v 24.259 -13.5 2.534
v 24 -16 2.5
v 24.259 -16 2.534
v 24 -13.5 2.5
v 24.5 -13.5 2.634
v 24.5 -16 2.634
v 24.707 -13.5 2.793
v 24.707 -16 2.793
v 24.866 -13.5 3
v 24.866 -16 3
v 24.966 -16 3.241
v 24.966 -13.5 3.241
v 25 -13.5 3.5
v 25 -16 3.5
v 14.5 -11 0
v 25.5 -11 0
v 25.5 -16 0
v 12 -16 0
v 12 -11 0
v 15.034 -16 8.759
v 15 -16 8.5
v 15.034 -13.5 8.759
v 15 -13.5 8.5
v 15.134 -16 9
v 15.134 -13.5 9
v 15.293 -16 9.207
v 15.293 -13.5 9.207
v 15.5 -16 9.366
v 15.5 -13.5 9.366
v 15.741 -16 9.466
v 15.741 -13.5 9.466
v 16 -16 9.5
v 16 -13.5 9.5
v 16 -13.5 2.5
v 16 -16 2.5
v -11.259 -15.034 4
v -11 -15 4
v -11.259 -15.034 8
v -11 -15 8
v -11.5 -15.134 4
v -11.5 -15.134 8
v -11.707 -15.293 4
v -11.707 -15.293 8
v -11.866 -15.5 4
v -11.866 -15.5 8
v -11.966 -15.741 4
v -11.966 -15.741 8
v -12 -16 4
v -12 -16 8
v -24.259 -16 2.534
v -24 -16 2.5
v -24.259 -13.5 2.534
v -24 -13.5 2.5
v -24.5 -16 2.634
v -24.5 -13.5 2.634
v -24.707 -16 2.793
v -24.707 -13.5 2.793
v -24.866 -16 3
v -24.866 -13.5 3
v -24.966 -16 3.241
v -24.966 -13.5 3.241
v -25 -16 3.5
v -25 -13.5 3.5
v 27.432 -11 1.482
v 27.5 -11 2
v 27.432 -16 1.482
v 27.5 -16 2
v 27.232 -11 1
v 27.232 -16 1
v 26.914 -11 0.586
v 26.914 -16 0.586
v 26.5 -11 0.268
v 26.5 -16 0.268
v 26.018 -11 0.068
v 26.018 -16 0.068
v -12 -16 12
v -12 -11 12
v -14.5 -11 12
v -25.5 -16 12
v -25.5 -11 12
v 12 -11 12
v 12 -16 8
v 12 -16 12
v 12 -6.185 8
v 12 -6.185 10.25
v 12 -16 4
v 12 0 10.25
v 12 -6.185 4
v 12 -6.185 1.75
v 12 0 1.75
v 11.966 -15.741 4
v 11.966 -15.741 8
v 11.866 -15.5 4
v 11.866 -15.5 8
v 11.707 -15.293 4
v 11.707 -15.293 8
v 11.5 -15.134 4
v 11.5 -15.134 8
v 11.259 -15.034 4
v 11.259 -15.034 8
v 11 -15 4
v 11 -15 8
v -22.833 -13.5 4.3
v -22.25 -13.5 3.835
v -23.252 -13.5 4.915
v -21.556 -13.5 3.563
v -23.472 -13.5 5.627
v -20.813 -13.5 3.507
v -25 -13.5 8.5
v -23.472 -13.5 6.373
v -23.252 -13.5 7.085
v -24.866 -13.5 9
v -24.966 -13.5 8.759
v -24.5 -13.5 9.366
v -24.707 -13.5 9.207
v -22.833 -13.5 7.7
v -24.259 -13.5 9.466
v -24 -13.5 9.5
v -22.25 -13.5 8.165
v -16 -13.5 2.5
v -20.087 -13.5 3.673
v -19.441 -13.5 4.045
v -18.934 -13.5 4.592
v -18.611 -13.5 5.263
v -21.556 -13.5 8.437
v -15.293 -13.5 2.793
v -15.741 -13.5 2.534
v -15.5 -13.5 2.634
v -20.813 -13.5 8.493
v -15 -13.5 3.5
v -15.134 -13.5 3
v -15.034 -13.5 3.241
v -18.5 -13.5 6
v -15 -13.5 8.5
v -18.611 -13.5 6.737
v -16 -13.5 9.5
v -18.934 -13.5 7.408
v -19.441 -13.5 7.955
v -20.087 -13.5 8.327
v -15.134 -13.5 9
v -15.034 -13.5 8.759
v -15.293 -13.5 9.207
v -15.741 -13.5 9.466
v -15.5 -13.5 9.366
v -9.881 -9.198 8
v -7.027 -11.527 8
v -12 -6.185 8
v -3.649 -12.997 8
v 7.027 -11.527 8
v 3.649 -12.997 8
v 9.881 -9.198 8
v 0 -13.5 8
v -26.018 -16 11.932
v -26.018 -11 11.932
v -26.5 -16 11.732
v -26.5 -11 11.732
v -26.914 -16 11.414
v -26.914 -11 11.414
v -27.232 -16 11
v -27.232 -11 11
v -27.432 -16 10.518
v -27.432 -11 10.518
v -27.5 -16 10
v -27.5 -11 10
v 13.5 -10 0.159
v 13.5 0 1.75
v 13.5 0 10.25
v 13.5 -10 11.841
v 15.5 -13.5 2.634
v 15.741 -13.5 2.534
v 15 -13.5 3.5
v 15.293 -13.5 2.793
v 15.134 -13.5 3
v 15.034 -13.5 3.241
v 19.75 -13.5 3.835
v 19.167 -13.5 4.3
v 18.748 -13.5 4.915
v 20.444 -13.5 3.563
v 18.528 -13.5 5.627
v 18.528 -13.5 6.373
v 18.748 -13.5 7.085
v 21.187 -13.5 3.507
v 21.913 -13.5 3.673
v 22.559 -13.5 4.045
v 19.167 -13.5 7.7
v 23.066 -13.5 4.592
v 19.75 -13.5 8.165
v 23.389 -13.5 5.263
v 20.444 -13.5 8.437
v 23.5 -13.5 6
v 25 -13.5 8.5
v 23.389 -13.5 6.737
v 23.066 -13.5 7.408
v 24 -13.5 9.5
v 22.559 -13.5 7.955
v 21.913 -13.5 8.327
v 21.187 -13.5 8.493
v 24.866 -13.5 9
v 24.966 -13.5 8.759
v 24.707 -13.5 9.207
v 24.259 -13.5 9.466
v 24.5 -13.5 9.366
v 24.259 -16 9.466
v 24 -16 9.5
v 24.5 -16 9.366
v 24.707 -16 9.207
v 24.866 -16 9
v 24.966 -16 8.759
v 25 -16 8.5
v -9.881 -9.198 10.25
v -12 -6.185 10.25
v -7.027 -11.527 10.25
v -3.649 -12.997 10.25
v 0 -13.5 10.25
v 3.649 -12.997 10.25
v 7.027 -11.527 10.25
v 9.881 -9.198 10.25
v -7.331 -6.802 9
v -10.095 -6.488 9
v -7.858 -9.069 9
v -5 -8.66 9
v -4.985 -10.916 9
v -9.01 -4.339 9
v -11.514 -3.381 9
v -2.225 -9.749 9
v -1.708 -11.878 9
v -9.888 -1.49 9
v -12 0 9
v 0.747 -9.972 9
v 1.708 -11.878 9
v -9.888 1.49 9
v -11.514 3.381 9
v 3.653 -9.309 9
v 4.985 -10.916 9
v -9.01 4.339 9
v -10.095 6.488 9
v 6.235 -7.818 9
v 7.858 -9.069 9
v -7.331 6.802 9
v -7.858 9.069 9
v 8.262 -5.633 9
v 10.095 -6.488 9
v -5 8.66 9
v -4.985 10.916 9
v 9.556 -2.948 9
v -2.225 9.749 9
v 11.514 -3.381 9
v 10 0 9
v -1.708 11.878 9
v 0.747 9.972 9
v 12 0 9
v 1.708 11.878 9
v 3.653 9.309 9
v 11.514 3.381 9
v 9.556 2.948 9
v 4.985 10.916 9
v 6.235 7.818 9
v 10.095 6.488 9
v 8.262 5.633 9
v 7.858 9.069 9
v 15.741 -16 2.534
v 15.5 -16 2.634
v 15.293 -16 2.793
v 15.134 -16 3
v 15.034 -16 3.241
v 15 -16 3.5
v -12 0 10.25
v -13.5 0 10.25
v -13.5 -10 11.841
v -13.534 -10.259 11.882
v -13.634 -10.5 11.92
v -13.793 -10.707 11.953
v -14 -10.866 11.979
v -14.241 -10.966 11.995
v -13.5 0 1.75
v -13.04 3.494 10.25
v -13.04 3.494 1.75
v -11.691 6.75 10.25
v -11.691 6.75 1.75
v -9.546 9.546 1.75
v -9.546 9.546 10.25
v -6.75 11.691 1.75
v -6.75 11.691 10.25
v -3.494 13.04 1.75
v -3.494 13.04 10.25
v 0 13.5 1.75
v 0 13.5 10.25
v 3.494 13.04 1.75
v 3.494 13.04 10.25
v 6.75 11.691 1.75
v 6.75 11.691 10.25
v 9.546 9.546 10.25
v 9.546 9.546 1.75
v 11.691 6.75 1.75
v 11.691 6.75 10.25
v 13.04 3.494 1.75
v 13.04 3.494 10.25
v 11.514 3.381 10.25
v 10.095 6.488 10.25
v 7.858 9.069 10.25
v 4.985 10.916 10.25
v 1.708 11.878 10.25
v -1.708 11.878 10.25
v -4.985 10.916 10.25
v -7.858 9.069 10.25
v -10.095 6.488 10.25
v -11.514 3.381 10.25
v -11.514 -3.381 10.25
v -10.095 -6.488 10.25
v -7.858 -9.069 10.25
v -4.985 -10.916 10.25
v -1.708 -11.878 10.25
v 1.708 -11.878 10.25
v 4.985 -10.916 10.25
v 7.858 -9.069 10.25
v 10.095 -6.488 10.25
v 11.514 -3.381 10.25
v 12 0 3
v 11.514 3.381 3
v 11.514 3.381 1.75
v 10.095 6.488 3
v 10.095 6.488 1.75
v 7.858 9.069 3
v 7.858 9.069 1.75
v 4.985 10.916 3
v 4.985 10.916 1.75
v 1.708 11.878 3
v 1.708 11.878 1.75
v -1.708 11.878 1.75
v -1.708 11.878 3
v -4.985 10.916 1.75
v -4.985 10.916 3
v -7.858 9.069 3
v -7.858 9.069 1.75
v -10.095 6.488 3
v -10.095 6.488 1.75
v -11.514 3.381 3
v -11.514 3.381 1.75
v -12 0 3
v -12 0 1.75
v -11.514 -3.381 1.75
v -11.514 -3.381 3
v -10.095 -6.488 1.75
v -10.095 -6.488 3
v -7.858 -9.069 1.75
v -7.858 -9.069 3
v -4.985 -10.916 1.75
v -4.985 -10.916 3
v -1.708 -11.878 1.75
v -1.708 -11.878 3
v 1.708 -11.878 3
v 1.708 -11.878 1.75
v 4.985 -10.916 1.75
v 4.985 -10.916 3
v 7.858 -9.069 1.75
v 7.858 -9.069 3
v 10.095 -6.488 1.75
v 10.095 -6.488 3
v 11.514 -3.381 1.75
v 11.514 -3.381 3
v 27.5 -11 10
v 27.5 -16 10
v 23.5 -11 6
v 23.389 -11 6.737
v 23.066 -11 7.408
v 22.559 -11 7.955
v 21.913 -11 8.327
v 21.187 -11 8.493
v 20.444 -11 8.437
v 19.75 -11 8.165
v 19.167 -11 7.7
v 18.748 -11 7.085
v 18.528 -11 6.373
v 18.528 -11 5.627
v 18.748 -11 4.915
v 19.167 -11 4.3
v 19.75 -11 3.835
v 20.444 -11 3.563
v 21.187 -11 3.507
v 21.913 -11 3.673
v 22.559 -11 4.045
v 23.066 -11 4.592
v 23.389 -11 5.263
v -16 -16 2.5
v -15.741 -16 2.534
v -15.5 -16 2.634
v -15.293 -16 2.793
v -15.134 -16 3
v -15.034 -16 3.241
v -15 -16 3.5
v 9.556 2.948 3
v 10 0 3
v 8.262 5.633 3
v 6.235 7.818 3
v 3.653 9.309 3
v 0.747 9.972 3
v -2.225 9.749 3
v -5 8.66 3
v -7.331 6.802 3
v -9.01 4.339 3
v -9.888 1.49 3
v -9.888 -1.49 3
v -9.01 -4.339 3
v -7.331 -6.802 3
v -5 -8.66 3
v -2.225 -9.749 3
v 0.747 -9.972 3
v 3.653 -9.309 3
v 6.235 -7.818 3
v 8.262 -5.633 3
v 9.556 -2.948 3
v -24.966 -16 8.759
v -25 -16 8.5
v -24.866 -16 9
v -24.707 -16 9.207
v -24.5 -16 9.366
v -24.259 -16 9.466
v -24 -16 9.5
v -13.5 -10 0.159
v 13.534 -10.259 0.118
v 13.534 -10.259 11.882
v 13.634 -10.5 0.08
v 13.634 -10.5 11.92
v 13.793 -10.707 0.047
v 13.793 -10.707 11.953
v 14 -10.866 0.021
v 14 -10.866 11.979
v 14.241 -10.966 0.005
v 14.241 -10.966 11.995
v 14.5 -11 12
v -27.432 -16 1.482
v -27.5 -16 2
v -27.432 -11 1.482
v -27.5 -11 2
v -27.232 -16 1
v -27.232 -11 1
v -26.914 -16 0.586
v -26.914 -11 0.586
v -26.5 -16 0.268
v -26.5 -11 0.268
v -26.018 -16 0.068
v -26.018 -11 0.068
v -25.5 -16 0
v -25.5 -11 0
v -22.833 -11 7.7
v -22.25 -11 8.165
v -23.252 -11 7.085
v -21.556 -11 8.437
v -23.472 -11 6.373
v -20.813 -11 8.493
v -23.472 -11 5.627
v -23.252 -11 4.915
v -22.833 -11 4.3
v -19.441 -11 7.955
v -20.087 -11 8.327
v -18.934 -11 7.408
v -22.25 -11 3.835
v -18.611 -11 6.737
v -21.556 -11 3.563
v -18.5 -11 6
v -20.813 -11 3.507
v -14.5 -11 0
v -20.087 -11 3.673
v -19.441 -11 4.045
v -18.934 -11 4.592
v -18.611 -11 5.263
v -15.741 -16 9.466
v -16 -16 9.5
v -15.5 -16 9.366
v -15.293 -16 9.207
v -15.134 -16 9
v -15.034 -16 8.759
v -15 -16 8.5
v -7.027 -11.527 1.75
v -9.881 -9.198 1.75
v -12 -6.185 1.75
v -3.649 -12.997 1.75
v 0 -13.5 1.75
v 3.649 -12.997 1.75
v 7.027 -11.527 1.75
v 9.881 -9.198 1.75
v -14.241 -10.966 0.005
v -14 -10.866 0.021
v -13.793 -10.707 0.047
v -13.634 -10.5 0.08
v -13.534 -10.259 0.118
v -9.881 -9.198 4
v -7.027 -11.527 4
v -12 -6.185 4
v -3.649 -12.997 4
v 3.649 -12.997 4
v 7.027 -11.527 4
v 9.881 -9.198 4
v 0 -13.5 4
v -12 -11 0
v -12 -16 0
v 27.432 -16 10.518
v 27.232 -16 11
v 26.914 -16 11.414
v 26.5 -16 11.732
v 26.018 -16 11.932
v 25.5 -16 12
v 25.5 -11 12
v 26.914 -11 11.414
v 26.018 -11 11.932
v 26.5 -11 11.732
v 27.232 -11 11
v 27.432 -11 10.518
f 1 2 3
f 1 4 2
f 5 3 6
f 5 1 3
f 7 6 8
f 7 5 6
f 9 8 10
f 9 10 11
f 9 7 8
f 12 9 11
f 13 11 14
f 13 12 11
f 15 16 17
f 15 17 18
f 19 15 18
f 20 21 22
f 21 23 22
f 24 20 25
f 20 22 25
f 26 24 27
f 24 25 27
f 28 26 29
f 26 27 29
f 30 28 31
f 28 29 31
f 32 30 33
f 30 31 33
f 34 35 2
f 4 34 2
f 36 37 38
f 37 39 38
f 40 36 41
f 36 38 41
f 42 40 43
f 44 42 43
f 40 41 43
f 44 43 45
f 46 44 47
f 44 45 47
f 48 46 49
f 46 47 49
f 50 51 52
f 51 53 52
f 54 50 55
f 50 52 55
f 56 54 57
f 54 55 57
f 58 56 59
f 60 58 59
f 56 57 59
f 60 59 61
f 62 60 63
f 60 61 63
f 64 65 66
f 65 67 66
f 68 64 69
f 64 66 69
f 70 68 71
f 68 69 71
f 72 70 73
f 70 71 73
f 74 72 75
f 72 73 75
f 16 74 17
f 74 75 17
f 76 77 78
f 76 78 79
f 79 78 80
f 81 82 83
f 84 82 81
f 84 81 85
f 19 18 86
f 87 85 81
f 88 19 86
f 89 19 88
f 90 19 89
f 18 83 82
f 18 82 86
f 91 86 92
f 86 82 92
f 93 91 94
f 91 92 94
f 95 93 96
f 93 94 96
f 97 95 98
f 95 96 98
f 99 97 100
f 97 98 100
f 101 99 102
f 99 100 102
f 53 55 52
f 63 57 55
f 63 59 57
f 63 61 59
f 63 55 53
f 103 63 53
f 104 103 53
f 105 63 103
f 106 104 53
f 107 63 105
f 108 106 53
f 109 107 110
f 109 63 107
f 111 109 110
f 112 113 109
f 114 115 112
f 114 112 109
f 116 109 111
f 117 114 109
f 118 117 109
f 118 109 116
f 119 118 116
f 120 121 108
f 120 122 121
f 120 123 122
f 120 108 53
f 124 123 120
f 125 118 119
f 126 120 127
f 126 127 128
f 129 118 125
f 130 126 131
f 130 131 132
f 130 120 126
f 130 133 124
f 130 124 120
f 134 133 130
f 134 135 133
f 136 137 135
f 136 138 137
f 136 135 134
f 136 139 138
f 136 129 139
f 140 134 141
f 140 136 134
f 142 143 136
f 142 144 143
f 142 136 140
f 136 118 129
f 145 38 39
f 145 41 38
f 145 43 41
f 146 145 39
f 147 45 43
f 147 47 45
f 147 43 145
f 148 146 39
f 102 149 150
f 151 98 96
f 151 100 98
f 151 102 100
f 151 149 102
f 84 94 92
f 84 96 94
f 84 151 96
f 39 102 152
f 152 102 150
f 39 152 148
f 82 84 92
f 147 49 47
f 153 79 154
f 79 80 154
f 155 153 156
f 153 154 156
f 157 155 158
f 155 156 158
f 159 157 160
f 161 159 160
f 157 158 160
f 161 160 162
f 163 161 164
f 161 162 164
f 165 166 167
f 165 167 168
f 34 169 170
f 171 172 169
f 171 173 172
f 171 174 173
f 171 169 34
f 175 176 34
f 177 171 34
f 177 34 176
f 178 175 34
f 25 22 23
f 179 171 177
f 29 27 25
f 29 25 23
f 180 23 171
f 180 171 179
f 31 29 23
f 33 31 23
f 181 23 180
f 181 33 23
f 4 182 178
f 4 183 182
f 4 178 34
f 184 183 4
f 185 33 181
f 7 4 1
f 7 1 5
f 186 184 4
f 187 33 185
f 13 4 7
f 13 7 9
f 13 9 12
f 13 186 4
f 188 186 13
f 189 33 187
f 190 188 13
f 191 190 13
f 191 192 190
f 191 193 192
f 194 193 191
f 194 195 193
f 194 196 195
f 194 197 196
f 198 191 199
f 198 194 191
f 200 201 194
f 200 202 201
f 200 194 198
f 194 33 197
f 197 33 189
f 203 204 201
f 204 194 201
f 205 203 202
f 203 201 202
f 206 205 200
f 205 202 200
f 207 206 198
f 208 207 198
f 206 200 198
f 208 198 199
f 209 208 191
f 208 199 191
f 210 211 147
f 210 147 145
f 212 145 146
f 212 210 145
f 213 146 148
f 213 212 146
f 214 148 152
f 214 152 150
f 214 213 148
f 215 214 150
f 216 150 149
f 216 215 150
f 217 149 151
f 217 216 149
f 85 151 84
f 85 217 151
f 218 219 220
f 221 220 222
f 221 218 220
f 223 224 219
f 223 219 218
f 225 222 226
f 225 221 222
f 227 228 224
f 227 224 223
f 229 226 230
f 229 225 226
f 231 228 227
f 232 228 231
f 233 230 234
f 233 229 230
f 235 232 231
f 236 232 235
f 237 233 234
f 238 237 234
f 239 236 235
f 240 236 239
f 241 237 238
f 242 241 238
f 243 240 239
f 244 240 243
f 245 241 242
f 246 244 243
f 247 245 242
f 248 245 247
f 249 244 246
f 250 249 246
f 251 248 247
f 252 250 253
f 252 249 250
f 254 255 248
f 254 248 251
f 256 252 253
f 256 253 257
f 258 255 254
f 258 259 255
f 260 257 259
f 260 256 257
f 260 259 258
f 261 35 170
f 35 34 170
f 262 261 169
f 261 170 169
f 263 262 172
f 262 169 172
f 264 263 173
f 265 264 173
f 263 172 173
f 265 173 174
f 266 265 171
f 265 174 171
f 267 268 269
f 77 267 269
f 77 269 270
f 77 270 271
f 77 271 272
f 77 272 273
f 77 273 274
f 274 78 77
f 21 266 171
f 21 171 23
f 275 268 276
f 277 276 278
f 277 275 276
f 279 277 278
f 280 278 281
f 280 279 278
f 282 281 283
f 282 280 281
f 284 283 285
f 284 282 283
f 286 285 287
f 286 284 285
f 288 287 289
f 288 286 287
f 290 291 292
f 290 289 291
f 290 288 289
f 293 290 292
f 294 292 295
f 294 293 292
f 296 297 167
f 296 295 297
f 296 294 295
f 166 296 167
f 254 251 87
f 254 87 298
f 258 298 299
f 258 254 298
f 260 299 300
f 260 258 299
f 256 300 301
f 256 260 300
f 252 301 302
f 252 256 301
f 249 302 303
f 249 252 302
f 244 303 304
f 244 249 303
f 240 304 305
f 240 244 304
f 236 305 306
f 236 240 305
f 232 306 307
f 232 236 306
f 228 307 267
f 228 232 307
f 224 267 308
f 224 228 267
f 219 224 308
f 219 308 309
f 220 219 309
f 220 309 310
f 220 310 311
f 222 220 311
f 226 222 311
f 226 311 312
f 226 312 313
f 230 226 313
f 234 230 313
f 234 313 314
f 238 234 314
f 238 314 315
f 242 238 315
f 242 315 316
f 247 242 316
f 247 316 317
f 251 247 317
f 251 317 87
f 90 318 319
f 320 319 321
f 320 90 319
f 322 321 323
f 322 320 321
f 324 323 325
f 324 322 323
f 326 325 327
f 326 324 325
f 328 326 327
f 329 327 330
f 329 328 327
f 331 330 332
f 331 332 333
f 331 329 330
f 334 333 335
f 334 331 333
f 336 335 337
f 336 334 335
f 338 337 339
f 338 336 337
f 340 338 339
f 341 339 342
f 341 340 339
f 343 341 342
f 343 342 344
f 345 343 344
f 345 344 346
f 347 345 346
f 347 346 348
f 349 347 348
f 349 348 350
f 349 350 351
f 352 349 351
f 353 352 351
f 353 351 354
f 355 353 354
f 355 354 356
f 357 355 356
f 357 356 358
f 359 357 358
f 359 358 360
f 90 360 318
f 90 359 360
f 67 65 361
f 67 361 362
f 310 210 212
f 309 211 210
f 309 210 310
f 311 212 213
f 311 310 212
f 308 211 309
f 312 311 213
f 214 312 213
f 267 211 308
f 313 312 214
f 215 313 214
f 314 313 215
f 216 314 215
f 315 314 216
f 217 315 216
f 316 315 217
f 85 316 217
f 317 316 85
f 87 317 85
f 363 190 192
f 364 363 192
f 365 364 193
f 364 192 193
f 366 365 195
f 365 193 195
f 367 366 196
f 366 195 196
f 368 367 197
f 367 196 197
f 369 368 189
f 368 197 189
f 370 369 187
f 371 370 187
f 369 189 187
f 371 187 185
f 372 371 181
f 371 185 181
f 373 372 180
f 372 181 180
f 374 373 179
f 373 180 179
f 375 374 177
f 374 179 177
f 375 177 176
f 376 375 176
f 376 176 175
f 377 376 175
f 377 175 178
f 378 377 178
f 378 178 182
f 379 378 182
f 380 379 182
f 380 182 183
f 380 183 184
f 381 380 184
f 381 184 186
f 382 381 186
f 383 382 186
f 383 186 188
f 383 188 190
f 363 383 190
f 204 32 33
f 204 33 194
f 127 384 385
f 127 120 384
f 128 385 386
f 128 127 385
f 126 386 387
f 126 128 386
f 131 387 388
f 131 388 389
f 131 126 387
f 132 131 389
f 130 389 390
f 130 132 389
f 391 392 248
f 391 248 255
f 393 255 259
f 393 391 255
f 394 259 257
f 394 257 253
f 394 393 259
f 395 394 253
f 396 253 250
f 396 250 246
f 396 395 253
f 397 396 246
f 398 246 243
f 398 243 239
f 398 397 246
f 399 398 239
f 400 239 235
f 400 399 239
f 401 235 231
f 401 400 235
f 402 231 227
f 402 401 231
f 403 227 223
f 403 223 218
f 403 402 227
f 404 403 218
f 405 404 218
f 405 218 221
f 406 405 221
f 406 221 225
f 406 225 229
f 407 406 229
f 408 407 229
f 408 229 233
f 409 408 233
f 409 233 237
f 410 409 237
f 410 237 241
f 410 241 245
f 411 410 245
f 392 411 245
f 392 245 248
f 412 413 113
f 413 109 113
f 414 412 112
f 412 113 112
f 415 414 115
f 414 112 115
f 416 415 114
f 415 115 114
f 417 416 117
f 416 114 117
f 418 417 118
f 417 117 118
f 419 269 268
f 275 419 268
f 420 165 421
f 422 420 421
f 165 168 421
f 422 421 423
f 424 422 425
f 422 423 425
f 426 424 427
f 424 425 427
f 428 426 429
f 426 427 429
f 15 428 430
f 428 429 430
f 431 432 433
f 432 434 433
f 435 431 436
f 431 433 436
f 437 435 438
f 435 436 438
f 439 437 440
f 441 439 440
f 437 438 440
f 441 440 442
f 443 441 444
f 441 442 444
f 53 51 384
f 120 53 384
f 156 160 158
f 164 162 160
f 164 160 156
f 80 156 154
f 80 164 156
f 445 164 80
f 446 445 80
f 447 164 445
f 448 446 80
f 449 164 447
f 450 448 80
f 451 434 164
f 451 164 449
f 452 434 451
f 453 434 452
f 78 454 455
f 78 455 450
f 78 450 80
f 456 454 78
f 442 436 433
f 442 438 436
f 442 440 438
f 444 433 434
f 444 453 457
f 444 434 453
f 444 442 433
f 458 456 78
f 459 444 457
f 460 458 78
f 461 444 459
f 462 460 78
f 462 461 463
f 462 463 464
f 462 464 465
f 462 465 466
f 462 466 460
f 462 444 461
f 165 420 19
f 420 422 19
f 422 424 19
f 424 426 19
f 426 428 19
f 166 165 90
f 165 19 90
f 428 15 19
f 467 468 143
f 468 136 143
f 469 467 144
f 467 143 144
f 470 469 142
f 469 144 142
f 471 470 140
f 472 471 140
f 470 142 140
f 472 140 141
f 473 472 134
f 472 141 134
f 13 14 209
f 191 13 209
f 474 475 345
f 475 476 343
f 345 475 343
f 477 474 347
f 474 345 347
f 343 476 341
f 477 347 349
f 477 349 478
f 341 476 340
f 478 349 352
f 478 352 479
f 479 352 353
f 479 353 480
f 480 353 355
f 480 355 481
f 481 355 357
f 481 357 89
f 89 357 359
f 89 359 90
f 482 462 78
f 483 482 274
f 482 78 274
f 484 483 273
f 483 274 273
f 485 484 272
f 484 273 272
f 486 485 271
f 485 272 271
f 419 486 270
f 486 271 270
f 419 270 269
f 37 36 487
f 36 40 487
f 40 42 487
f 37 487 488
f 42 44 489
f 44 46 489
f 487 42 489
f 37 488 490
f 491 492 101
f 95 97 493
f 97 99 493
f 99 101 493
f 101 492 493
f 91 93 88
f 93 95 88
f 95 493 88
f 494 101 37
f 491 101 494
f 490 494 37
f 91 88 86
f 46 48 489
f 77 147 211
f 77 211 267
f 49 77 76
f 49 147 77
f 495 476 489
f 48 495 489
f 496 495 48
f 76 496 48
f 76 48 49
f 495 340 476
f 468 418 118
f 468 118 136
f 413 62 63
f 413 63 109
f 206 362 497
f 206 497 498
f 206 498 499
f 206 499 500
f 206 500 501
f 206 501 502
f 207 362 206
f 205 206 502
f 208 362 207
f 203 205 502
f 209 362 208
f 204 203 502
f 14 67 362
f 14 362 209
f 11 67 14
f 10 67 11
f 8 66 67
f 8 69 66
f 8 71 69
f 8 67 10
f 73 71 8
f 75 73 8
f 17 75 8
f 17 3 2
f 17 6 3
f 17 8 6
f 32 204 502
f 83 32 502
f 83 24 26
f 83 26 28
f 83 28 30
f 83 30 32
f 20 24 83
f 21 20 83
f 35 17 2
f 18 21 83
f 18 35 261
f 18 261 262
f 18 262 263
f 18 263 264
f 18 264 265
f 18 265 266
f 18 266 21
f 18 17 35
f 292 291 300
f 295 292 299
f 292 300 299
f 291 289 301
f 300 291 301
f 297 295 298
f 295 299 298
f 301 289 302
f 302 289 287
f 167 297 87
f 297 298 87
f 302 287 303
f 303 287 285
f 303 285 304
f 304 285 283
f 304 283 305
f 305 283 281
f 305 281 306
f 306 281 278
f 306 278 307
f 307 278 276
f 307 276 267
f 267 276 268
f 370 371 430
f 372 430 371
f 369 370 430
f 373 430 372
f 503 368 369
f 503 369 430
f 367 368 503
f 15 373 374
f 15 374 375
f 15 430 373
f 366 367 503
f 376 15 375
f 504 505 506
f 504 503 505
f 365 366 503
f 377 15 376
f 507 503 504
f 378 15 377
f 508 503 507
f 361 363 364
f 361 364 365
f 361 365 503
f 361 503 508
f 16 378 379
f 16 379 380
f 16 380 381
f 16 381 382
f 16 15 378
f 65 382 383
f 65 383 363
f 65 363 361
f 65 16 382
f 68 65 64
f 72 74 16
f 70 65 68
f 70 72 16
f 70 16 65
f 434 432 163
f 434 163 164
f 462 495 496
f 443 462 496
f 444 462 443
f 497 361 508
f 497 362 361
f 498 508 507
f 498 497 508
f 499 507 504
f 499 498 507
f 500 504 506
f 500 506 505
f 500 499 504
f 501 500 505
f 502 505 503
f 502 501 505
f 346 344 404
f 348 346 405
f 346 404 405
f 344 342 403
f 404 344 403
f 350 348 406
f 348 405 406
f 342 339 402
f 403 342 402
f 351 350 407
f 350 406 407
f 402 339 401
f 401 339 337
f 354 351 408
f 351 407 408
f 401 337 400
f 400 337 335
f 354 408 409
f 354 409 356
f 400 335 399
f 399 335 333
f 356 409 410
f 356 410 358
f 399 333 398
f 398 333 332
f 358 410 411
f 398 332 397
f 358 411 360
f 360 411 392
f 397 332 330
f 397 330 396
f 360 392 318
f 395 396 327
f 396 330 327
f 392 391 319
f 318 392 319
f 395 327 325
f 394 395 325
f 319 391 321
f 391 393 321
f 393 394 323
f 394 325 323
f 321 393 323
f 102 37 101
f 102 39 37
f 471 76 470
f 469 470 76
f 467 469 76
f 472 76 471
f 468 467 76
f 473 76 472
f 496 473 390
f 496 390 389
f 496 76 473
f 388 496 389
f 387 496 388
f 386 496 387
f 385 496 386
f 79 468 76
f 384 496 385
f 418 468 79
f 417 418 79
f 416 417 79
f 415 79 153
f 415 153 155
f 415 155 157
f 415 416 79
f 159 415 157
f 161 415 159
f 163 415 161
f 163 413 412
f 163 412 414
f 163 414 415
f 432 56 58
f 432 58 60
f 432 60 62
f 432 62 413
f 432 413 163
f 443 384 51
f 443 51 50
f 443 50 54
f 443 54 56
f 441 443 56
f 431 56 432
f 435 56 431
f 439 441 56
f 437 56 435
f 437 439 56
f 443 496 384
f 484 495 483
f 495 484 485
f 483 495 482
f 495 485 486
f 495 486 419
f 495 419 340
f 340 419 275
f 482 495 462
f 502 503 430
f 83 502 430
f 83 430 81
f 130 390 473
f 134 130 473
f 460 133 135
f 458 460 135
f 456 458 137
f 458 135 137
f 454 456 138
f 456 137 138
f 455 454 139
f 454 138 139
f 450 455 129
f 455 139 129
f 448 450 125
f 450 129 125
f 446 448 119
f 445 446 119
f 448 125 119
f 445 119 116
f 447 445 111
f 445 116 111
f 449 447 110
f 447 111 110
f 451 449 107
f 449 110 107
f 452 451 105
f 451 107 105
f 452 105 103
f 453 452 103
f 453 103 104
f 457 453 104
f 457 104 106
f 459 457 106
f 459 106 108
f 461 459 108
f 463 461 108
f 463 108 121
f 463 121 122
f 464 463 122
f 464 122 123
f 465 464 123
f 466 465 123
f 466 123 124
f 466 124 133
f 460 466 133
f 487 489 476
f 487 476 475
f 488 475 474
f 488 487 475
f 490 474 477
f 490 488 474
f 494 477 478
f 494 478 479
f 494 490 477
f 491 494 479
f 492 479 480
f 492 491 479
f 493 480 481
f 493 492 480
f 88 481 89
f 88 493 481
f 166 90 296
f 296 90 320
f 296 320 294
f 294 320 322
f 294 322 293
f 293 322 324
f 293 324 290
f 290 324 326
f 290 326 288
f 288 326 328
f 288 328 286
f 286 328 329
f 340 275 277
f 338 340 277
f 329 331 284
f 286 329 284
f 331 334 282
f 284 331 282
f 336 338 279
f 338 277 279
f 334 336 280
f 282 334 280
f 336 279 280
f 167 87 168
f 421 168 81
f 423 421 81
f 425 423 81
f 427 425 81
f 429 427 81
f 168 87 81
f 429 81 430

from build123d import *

# Parameters (mm, degrees)
SKETCH1_R           = 10
BOSS_EXTRUDE1_DEPTH = 12
CUT_EXTRUDE1_DEPTH  = 59.523499554
CUT_EXTRUDE2_START  = 8
CUT_EXTRUDE2_DEPTH  = 4
CUT_EXTRUDE3_DEPTH  = 4
BOSS_EXTRUDE2_START = 6
SKETCH4_R           = 13.5
SKETCH4_R_2         = 12
BOSS_EXTRUDE2_DEPTH = 4.25
SKETCH6_R           = 12
SKETCH6_R_2         = 10
CUT_EXTRUDE4_DEPTH  = 3
CUT_EXTRUDE5_START  = 9
SKETCH6_2_R         = 12
SKETCH6_2_R_2       = 10
CUT_EXTRUDE5_DEPTH  = 3
SKETCH7_R           = 2.5
CUT_EXTRUDE6_DEPTH  = 5
SKETCH8_W           = 10
SKETCH8_H           = 7
CUT_EXTRUDE7_DEPTH  = 2.5
SKETCH9_W           = 24
SKETCH9_H           = 4
CUT_EXTRUDE8_DEPTH  = 1
FILLET1_R           = 1
FILLET2_R           = 2
FILLET3_R           = 1


with BuildPart() as part:
    # Sketch1 → Boss-Extrude1 (new body)
    with BuildSketch(Plane.XY):
        with BuildLine():
            Line((27.5, -16), (-27.5, -16))
            Line((-27.5, -16), (-27.5, -11))
            Line((-27.5, -11), (-13.5, -11))
            Line((-13.5, -11), (-13.5, 0))
            ThreePointArc((-13.5, 0), (0, 13.5), (13.5, 0))
            Line((13.5, 0), (13.5, -11))
            Line((13.5, -11), (27.5, -11))
            Line((27.5, -11), (27.5, -16))
        make_face()
        Circle(SKETCH1_R, mode=Mode.SUBTRACT)
    extrude(amount=BOSS_EXTRUDE1_DEPTH)

    # Sketch2 → Cut-Extrude1 (cut, through all)
    with BuildSketch(Plane.ZY.offset(27.5)):
        Polygon((10.25, 0), (12, -11), (12, 13.5), (10.25, 13.5), align=None)
        Polygon((0, -11), (1.75, 0), (1.75, 13.5), (0, 13.5), align=None)
    extrude(amount=-CUT_EXTRUDE1_DEPTH, mode=Mode.SUBTRACT)

    # Sketch3 → Cut-Extrude2 (cut)
    with BuildSketch(Plane.XY.offset(CUT_EXTRUDE2_START)):
        with BuildLine():
            ThreePointArc((12, 0), (0, -12), (-12, 0))
            Line((-12, 0), (-12, -16))
            Line((-12, -16), (12, -16))
            Line((12, -16), (12, 0))
        make_face()
    extrude(amount=CUT_EXTRUDE2_DEPTH, mode=Mode.SUBTRACT)

    # Sketch3<3> → Cut-Extrude3 (cut)
    with BuildSketch(Plane.XY):
        with BuildLine():
            ThreePointArc((12, 0), (0, -12), (-12, 0))
            Line((-12, 0), (-12, -16))
            Line((-12, -16), (12, -16))
            Line((12, -16), (12, 0))
        make_face()
    extrude(amount=CUT_EXTRUDE3_DEPTH, mode=Mode.SUBTRACT)

    # Sketch4 → Boss-Extrude2 (add, symmetric)
    with BuildSketch(Plane.XY.offset(BOSS_EXTRUDE2_START)):
        Circle(SKETCH4_R)
        Circle(SKETCH4_R_2, mode=Mode.SUBTRACT)
    extrude(amount=BOSS_EXTRUDE2_DEPTH, both=True)

    # Sketch6 → Cut-Extrude4 (cut)
    with BuildSketch(Plane.XY):
        Circle(SKETCH6_R)
        Circle(SKETCH6_R_2, mode=Mode.SUBTRACT)
    extrude(amount=CUT_EXTRUDE4_DEPTH, mode=Mode.SUBTRACT)

    # Sketch6<2> → Cut-Extrude5 (cut)
    with BuildSketch(Plane.XY.offset(CUT_EXTRUDE5_START)):
        Circle(SKETCH6_2_R)
        Circle(SKETCH6_2_R_2, mode=Mode.SUBTRACT)
    extrude(amount=CUT_EXTRUDE5_DEPTH, mode=Mode.SUBTRACT)

    # Sketch7 → Cut-Extrude6 (cut)
    with BuildSketch(Plane.XZ.offset(16)):
        with Locations((-21, 6)):
            Circle(SKETCH7_R)
        with Locations((21, 6)):
            Circle(SKETCH7_R)
    extrude(amount=-CUT_EXTRUDE6_DEPTH, mode=Mode.SUBTRACT)

    # Sketch8 → Cut-Extrude7 (cut)
    with BuildSketch(Plane.XZ.offset(16)):
        with Locations((20, 6)):
            Rectangle(SKETCH8_W, SKETCH8_H)
        with Locations((-20, 6)):
            Rectangle(SKETCH8_W, SKETCH8_H)
    extrude(amount=-CUT_EXTRUDE7_DEPTH, mode=Mode.SUBTRACT)

    # Sketch9 → Cut-Extrude8 (cut)
    with BuildSketch(Plane.XZ.offset(16)):
        with Locations((0, 6)):
            Rectangle(SKETCH9_W, SKETCH9_H)
    extrude(amount=-CUT_EXTRUDE8_DEPTH, mode=Mode.SUBTRACT)

    # Fillet1
    fillet1_edges = [part.edges().sort_by_distance(p)[0] for p in [
        (13.5, -11, 6),
        (-13.5, -11, 6),
        (12, -15, 6),
        (-12, -15, 6),
    ]]
    fillet(fillet1_edges, radius=FILLET1_R - 0.0001)  # a hair under: the kernel refuses the full size

    # Fillet2
    fillet2_edges = [part.edges().sort_by_distance(p)[0] for p in [
        (-27.5, -13.5, 0),
        (-27.5, -13.5, 12),
        (27.5, -13.5, 12),
        (27.5, -13.5, 0),
    ]]
    fillet(fillet2_edges, radius=FILLET2_R)

    # Fillet3
    fillet3_edges = [part.edges().sort_by_distance(p)[0] for p in [
        (-25, -14.75, 9.5),
        (-15, -14.75, 9.5),
        (-15, -14.75, 2.5),
        (-25, -14.75, 2.5),
        (25, -14.75, 9.5),
        (25, -14.75, 2.5),
        (15, -14.75, 2.5),
        (15, -14.75, 9.5),
    ]]
    fillet(fillet3_edges, radius=FILLET3_R)


solid = part.part
